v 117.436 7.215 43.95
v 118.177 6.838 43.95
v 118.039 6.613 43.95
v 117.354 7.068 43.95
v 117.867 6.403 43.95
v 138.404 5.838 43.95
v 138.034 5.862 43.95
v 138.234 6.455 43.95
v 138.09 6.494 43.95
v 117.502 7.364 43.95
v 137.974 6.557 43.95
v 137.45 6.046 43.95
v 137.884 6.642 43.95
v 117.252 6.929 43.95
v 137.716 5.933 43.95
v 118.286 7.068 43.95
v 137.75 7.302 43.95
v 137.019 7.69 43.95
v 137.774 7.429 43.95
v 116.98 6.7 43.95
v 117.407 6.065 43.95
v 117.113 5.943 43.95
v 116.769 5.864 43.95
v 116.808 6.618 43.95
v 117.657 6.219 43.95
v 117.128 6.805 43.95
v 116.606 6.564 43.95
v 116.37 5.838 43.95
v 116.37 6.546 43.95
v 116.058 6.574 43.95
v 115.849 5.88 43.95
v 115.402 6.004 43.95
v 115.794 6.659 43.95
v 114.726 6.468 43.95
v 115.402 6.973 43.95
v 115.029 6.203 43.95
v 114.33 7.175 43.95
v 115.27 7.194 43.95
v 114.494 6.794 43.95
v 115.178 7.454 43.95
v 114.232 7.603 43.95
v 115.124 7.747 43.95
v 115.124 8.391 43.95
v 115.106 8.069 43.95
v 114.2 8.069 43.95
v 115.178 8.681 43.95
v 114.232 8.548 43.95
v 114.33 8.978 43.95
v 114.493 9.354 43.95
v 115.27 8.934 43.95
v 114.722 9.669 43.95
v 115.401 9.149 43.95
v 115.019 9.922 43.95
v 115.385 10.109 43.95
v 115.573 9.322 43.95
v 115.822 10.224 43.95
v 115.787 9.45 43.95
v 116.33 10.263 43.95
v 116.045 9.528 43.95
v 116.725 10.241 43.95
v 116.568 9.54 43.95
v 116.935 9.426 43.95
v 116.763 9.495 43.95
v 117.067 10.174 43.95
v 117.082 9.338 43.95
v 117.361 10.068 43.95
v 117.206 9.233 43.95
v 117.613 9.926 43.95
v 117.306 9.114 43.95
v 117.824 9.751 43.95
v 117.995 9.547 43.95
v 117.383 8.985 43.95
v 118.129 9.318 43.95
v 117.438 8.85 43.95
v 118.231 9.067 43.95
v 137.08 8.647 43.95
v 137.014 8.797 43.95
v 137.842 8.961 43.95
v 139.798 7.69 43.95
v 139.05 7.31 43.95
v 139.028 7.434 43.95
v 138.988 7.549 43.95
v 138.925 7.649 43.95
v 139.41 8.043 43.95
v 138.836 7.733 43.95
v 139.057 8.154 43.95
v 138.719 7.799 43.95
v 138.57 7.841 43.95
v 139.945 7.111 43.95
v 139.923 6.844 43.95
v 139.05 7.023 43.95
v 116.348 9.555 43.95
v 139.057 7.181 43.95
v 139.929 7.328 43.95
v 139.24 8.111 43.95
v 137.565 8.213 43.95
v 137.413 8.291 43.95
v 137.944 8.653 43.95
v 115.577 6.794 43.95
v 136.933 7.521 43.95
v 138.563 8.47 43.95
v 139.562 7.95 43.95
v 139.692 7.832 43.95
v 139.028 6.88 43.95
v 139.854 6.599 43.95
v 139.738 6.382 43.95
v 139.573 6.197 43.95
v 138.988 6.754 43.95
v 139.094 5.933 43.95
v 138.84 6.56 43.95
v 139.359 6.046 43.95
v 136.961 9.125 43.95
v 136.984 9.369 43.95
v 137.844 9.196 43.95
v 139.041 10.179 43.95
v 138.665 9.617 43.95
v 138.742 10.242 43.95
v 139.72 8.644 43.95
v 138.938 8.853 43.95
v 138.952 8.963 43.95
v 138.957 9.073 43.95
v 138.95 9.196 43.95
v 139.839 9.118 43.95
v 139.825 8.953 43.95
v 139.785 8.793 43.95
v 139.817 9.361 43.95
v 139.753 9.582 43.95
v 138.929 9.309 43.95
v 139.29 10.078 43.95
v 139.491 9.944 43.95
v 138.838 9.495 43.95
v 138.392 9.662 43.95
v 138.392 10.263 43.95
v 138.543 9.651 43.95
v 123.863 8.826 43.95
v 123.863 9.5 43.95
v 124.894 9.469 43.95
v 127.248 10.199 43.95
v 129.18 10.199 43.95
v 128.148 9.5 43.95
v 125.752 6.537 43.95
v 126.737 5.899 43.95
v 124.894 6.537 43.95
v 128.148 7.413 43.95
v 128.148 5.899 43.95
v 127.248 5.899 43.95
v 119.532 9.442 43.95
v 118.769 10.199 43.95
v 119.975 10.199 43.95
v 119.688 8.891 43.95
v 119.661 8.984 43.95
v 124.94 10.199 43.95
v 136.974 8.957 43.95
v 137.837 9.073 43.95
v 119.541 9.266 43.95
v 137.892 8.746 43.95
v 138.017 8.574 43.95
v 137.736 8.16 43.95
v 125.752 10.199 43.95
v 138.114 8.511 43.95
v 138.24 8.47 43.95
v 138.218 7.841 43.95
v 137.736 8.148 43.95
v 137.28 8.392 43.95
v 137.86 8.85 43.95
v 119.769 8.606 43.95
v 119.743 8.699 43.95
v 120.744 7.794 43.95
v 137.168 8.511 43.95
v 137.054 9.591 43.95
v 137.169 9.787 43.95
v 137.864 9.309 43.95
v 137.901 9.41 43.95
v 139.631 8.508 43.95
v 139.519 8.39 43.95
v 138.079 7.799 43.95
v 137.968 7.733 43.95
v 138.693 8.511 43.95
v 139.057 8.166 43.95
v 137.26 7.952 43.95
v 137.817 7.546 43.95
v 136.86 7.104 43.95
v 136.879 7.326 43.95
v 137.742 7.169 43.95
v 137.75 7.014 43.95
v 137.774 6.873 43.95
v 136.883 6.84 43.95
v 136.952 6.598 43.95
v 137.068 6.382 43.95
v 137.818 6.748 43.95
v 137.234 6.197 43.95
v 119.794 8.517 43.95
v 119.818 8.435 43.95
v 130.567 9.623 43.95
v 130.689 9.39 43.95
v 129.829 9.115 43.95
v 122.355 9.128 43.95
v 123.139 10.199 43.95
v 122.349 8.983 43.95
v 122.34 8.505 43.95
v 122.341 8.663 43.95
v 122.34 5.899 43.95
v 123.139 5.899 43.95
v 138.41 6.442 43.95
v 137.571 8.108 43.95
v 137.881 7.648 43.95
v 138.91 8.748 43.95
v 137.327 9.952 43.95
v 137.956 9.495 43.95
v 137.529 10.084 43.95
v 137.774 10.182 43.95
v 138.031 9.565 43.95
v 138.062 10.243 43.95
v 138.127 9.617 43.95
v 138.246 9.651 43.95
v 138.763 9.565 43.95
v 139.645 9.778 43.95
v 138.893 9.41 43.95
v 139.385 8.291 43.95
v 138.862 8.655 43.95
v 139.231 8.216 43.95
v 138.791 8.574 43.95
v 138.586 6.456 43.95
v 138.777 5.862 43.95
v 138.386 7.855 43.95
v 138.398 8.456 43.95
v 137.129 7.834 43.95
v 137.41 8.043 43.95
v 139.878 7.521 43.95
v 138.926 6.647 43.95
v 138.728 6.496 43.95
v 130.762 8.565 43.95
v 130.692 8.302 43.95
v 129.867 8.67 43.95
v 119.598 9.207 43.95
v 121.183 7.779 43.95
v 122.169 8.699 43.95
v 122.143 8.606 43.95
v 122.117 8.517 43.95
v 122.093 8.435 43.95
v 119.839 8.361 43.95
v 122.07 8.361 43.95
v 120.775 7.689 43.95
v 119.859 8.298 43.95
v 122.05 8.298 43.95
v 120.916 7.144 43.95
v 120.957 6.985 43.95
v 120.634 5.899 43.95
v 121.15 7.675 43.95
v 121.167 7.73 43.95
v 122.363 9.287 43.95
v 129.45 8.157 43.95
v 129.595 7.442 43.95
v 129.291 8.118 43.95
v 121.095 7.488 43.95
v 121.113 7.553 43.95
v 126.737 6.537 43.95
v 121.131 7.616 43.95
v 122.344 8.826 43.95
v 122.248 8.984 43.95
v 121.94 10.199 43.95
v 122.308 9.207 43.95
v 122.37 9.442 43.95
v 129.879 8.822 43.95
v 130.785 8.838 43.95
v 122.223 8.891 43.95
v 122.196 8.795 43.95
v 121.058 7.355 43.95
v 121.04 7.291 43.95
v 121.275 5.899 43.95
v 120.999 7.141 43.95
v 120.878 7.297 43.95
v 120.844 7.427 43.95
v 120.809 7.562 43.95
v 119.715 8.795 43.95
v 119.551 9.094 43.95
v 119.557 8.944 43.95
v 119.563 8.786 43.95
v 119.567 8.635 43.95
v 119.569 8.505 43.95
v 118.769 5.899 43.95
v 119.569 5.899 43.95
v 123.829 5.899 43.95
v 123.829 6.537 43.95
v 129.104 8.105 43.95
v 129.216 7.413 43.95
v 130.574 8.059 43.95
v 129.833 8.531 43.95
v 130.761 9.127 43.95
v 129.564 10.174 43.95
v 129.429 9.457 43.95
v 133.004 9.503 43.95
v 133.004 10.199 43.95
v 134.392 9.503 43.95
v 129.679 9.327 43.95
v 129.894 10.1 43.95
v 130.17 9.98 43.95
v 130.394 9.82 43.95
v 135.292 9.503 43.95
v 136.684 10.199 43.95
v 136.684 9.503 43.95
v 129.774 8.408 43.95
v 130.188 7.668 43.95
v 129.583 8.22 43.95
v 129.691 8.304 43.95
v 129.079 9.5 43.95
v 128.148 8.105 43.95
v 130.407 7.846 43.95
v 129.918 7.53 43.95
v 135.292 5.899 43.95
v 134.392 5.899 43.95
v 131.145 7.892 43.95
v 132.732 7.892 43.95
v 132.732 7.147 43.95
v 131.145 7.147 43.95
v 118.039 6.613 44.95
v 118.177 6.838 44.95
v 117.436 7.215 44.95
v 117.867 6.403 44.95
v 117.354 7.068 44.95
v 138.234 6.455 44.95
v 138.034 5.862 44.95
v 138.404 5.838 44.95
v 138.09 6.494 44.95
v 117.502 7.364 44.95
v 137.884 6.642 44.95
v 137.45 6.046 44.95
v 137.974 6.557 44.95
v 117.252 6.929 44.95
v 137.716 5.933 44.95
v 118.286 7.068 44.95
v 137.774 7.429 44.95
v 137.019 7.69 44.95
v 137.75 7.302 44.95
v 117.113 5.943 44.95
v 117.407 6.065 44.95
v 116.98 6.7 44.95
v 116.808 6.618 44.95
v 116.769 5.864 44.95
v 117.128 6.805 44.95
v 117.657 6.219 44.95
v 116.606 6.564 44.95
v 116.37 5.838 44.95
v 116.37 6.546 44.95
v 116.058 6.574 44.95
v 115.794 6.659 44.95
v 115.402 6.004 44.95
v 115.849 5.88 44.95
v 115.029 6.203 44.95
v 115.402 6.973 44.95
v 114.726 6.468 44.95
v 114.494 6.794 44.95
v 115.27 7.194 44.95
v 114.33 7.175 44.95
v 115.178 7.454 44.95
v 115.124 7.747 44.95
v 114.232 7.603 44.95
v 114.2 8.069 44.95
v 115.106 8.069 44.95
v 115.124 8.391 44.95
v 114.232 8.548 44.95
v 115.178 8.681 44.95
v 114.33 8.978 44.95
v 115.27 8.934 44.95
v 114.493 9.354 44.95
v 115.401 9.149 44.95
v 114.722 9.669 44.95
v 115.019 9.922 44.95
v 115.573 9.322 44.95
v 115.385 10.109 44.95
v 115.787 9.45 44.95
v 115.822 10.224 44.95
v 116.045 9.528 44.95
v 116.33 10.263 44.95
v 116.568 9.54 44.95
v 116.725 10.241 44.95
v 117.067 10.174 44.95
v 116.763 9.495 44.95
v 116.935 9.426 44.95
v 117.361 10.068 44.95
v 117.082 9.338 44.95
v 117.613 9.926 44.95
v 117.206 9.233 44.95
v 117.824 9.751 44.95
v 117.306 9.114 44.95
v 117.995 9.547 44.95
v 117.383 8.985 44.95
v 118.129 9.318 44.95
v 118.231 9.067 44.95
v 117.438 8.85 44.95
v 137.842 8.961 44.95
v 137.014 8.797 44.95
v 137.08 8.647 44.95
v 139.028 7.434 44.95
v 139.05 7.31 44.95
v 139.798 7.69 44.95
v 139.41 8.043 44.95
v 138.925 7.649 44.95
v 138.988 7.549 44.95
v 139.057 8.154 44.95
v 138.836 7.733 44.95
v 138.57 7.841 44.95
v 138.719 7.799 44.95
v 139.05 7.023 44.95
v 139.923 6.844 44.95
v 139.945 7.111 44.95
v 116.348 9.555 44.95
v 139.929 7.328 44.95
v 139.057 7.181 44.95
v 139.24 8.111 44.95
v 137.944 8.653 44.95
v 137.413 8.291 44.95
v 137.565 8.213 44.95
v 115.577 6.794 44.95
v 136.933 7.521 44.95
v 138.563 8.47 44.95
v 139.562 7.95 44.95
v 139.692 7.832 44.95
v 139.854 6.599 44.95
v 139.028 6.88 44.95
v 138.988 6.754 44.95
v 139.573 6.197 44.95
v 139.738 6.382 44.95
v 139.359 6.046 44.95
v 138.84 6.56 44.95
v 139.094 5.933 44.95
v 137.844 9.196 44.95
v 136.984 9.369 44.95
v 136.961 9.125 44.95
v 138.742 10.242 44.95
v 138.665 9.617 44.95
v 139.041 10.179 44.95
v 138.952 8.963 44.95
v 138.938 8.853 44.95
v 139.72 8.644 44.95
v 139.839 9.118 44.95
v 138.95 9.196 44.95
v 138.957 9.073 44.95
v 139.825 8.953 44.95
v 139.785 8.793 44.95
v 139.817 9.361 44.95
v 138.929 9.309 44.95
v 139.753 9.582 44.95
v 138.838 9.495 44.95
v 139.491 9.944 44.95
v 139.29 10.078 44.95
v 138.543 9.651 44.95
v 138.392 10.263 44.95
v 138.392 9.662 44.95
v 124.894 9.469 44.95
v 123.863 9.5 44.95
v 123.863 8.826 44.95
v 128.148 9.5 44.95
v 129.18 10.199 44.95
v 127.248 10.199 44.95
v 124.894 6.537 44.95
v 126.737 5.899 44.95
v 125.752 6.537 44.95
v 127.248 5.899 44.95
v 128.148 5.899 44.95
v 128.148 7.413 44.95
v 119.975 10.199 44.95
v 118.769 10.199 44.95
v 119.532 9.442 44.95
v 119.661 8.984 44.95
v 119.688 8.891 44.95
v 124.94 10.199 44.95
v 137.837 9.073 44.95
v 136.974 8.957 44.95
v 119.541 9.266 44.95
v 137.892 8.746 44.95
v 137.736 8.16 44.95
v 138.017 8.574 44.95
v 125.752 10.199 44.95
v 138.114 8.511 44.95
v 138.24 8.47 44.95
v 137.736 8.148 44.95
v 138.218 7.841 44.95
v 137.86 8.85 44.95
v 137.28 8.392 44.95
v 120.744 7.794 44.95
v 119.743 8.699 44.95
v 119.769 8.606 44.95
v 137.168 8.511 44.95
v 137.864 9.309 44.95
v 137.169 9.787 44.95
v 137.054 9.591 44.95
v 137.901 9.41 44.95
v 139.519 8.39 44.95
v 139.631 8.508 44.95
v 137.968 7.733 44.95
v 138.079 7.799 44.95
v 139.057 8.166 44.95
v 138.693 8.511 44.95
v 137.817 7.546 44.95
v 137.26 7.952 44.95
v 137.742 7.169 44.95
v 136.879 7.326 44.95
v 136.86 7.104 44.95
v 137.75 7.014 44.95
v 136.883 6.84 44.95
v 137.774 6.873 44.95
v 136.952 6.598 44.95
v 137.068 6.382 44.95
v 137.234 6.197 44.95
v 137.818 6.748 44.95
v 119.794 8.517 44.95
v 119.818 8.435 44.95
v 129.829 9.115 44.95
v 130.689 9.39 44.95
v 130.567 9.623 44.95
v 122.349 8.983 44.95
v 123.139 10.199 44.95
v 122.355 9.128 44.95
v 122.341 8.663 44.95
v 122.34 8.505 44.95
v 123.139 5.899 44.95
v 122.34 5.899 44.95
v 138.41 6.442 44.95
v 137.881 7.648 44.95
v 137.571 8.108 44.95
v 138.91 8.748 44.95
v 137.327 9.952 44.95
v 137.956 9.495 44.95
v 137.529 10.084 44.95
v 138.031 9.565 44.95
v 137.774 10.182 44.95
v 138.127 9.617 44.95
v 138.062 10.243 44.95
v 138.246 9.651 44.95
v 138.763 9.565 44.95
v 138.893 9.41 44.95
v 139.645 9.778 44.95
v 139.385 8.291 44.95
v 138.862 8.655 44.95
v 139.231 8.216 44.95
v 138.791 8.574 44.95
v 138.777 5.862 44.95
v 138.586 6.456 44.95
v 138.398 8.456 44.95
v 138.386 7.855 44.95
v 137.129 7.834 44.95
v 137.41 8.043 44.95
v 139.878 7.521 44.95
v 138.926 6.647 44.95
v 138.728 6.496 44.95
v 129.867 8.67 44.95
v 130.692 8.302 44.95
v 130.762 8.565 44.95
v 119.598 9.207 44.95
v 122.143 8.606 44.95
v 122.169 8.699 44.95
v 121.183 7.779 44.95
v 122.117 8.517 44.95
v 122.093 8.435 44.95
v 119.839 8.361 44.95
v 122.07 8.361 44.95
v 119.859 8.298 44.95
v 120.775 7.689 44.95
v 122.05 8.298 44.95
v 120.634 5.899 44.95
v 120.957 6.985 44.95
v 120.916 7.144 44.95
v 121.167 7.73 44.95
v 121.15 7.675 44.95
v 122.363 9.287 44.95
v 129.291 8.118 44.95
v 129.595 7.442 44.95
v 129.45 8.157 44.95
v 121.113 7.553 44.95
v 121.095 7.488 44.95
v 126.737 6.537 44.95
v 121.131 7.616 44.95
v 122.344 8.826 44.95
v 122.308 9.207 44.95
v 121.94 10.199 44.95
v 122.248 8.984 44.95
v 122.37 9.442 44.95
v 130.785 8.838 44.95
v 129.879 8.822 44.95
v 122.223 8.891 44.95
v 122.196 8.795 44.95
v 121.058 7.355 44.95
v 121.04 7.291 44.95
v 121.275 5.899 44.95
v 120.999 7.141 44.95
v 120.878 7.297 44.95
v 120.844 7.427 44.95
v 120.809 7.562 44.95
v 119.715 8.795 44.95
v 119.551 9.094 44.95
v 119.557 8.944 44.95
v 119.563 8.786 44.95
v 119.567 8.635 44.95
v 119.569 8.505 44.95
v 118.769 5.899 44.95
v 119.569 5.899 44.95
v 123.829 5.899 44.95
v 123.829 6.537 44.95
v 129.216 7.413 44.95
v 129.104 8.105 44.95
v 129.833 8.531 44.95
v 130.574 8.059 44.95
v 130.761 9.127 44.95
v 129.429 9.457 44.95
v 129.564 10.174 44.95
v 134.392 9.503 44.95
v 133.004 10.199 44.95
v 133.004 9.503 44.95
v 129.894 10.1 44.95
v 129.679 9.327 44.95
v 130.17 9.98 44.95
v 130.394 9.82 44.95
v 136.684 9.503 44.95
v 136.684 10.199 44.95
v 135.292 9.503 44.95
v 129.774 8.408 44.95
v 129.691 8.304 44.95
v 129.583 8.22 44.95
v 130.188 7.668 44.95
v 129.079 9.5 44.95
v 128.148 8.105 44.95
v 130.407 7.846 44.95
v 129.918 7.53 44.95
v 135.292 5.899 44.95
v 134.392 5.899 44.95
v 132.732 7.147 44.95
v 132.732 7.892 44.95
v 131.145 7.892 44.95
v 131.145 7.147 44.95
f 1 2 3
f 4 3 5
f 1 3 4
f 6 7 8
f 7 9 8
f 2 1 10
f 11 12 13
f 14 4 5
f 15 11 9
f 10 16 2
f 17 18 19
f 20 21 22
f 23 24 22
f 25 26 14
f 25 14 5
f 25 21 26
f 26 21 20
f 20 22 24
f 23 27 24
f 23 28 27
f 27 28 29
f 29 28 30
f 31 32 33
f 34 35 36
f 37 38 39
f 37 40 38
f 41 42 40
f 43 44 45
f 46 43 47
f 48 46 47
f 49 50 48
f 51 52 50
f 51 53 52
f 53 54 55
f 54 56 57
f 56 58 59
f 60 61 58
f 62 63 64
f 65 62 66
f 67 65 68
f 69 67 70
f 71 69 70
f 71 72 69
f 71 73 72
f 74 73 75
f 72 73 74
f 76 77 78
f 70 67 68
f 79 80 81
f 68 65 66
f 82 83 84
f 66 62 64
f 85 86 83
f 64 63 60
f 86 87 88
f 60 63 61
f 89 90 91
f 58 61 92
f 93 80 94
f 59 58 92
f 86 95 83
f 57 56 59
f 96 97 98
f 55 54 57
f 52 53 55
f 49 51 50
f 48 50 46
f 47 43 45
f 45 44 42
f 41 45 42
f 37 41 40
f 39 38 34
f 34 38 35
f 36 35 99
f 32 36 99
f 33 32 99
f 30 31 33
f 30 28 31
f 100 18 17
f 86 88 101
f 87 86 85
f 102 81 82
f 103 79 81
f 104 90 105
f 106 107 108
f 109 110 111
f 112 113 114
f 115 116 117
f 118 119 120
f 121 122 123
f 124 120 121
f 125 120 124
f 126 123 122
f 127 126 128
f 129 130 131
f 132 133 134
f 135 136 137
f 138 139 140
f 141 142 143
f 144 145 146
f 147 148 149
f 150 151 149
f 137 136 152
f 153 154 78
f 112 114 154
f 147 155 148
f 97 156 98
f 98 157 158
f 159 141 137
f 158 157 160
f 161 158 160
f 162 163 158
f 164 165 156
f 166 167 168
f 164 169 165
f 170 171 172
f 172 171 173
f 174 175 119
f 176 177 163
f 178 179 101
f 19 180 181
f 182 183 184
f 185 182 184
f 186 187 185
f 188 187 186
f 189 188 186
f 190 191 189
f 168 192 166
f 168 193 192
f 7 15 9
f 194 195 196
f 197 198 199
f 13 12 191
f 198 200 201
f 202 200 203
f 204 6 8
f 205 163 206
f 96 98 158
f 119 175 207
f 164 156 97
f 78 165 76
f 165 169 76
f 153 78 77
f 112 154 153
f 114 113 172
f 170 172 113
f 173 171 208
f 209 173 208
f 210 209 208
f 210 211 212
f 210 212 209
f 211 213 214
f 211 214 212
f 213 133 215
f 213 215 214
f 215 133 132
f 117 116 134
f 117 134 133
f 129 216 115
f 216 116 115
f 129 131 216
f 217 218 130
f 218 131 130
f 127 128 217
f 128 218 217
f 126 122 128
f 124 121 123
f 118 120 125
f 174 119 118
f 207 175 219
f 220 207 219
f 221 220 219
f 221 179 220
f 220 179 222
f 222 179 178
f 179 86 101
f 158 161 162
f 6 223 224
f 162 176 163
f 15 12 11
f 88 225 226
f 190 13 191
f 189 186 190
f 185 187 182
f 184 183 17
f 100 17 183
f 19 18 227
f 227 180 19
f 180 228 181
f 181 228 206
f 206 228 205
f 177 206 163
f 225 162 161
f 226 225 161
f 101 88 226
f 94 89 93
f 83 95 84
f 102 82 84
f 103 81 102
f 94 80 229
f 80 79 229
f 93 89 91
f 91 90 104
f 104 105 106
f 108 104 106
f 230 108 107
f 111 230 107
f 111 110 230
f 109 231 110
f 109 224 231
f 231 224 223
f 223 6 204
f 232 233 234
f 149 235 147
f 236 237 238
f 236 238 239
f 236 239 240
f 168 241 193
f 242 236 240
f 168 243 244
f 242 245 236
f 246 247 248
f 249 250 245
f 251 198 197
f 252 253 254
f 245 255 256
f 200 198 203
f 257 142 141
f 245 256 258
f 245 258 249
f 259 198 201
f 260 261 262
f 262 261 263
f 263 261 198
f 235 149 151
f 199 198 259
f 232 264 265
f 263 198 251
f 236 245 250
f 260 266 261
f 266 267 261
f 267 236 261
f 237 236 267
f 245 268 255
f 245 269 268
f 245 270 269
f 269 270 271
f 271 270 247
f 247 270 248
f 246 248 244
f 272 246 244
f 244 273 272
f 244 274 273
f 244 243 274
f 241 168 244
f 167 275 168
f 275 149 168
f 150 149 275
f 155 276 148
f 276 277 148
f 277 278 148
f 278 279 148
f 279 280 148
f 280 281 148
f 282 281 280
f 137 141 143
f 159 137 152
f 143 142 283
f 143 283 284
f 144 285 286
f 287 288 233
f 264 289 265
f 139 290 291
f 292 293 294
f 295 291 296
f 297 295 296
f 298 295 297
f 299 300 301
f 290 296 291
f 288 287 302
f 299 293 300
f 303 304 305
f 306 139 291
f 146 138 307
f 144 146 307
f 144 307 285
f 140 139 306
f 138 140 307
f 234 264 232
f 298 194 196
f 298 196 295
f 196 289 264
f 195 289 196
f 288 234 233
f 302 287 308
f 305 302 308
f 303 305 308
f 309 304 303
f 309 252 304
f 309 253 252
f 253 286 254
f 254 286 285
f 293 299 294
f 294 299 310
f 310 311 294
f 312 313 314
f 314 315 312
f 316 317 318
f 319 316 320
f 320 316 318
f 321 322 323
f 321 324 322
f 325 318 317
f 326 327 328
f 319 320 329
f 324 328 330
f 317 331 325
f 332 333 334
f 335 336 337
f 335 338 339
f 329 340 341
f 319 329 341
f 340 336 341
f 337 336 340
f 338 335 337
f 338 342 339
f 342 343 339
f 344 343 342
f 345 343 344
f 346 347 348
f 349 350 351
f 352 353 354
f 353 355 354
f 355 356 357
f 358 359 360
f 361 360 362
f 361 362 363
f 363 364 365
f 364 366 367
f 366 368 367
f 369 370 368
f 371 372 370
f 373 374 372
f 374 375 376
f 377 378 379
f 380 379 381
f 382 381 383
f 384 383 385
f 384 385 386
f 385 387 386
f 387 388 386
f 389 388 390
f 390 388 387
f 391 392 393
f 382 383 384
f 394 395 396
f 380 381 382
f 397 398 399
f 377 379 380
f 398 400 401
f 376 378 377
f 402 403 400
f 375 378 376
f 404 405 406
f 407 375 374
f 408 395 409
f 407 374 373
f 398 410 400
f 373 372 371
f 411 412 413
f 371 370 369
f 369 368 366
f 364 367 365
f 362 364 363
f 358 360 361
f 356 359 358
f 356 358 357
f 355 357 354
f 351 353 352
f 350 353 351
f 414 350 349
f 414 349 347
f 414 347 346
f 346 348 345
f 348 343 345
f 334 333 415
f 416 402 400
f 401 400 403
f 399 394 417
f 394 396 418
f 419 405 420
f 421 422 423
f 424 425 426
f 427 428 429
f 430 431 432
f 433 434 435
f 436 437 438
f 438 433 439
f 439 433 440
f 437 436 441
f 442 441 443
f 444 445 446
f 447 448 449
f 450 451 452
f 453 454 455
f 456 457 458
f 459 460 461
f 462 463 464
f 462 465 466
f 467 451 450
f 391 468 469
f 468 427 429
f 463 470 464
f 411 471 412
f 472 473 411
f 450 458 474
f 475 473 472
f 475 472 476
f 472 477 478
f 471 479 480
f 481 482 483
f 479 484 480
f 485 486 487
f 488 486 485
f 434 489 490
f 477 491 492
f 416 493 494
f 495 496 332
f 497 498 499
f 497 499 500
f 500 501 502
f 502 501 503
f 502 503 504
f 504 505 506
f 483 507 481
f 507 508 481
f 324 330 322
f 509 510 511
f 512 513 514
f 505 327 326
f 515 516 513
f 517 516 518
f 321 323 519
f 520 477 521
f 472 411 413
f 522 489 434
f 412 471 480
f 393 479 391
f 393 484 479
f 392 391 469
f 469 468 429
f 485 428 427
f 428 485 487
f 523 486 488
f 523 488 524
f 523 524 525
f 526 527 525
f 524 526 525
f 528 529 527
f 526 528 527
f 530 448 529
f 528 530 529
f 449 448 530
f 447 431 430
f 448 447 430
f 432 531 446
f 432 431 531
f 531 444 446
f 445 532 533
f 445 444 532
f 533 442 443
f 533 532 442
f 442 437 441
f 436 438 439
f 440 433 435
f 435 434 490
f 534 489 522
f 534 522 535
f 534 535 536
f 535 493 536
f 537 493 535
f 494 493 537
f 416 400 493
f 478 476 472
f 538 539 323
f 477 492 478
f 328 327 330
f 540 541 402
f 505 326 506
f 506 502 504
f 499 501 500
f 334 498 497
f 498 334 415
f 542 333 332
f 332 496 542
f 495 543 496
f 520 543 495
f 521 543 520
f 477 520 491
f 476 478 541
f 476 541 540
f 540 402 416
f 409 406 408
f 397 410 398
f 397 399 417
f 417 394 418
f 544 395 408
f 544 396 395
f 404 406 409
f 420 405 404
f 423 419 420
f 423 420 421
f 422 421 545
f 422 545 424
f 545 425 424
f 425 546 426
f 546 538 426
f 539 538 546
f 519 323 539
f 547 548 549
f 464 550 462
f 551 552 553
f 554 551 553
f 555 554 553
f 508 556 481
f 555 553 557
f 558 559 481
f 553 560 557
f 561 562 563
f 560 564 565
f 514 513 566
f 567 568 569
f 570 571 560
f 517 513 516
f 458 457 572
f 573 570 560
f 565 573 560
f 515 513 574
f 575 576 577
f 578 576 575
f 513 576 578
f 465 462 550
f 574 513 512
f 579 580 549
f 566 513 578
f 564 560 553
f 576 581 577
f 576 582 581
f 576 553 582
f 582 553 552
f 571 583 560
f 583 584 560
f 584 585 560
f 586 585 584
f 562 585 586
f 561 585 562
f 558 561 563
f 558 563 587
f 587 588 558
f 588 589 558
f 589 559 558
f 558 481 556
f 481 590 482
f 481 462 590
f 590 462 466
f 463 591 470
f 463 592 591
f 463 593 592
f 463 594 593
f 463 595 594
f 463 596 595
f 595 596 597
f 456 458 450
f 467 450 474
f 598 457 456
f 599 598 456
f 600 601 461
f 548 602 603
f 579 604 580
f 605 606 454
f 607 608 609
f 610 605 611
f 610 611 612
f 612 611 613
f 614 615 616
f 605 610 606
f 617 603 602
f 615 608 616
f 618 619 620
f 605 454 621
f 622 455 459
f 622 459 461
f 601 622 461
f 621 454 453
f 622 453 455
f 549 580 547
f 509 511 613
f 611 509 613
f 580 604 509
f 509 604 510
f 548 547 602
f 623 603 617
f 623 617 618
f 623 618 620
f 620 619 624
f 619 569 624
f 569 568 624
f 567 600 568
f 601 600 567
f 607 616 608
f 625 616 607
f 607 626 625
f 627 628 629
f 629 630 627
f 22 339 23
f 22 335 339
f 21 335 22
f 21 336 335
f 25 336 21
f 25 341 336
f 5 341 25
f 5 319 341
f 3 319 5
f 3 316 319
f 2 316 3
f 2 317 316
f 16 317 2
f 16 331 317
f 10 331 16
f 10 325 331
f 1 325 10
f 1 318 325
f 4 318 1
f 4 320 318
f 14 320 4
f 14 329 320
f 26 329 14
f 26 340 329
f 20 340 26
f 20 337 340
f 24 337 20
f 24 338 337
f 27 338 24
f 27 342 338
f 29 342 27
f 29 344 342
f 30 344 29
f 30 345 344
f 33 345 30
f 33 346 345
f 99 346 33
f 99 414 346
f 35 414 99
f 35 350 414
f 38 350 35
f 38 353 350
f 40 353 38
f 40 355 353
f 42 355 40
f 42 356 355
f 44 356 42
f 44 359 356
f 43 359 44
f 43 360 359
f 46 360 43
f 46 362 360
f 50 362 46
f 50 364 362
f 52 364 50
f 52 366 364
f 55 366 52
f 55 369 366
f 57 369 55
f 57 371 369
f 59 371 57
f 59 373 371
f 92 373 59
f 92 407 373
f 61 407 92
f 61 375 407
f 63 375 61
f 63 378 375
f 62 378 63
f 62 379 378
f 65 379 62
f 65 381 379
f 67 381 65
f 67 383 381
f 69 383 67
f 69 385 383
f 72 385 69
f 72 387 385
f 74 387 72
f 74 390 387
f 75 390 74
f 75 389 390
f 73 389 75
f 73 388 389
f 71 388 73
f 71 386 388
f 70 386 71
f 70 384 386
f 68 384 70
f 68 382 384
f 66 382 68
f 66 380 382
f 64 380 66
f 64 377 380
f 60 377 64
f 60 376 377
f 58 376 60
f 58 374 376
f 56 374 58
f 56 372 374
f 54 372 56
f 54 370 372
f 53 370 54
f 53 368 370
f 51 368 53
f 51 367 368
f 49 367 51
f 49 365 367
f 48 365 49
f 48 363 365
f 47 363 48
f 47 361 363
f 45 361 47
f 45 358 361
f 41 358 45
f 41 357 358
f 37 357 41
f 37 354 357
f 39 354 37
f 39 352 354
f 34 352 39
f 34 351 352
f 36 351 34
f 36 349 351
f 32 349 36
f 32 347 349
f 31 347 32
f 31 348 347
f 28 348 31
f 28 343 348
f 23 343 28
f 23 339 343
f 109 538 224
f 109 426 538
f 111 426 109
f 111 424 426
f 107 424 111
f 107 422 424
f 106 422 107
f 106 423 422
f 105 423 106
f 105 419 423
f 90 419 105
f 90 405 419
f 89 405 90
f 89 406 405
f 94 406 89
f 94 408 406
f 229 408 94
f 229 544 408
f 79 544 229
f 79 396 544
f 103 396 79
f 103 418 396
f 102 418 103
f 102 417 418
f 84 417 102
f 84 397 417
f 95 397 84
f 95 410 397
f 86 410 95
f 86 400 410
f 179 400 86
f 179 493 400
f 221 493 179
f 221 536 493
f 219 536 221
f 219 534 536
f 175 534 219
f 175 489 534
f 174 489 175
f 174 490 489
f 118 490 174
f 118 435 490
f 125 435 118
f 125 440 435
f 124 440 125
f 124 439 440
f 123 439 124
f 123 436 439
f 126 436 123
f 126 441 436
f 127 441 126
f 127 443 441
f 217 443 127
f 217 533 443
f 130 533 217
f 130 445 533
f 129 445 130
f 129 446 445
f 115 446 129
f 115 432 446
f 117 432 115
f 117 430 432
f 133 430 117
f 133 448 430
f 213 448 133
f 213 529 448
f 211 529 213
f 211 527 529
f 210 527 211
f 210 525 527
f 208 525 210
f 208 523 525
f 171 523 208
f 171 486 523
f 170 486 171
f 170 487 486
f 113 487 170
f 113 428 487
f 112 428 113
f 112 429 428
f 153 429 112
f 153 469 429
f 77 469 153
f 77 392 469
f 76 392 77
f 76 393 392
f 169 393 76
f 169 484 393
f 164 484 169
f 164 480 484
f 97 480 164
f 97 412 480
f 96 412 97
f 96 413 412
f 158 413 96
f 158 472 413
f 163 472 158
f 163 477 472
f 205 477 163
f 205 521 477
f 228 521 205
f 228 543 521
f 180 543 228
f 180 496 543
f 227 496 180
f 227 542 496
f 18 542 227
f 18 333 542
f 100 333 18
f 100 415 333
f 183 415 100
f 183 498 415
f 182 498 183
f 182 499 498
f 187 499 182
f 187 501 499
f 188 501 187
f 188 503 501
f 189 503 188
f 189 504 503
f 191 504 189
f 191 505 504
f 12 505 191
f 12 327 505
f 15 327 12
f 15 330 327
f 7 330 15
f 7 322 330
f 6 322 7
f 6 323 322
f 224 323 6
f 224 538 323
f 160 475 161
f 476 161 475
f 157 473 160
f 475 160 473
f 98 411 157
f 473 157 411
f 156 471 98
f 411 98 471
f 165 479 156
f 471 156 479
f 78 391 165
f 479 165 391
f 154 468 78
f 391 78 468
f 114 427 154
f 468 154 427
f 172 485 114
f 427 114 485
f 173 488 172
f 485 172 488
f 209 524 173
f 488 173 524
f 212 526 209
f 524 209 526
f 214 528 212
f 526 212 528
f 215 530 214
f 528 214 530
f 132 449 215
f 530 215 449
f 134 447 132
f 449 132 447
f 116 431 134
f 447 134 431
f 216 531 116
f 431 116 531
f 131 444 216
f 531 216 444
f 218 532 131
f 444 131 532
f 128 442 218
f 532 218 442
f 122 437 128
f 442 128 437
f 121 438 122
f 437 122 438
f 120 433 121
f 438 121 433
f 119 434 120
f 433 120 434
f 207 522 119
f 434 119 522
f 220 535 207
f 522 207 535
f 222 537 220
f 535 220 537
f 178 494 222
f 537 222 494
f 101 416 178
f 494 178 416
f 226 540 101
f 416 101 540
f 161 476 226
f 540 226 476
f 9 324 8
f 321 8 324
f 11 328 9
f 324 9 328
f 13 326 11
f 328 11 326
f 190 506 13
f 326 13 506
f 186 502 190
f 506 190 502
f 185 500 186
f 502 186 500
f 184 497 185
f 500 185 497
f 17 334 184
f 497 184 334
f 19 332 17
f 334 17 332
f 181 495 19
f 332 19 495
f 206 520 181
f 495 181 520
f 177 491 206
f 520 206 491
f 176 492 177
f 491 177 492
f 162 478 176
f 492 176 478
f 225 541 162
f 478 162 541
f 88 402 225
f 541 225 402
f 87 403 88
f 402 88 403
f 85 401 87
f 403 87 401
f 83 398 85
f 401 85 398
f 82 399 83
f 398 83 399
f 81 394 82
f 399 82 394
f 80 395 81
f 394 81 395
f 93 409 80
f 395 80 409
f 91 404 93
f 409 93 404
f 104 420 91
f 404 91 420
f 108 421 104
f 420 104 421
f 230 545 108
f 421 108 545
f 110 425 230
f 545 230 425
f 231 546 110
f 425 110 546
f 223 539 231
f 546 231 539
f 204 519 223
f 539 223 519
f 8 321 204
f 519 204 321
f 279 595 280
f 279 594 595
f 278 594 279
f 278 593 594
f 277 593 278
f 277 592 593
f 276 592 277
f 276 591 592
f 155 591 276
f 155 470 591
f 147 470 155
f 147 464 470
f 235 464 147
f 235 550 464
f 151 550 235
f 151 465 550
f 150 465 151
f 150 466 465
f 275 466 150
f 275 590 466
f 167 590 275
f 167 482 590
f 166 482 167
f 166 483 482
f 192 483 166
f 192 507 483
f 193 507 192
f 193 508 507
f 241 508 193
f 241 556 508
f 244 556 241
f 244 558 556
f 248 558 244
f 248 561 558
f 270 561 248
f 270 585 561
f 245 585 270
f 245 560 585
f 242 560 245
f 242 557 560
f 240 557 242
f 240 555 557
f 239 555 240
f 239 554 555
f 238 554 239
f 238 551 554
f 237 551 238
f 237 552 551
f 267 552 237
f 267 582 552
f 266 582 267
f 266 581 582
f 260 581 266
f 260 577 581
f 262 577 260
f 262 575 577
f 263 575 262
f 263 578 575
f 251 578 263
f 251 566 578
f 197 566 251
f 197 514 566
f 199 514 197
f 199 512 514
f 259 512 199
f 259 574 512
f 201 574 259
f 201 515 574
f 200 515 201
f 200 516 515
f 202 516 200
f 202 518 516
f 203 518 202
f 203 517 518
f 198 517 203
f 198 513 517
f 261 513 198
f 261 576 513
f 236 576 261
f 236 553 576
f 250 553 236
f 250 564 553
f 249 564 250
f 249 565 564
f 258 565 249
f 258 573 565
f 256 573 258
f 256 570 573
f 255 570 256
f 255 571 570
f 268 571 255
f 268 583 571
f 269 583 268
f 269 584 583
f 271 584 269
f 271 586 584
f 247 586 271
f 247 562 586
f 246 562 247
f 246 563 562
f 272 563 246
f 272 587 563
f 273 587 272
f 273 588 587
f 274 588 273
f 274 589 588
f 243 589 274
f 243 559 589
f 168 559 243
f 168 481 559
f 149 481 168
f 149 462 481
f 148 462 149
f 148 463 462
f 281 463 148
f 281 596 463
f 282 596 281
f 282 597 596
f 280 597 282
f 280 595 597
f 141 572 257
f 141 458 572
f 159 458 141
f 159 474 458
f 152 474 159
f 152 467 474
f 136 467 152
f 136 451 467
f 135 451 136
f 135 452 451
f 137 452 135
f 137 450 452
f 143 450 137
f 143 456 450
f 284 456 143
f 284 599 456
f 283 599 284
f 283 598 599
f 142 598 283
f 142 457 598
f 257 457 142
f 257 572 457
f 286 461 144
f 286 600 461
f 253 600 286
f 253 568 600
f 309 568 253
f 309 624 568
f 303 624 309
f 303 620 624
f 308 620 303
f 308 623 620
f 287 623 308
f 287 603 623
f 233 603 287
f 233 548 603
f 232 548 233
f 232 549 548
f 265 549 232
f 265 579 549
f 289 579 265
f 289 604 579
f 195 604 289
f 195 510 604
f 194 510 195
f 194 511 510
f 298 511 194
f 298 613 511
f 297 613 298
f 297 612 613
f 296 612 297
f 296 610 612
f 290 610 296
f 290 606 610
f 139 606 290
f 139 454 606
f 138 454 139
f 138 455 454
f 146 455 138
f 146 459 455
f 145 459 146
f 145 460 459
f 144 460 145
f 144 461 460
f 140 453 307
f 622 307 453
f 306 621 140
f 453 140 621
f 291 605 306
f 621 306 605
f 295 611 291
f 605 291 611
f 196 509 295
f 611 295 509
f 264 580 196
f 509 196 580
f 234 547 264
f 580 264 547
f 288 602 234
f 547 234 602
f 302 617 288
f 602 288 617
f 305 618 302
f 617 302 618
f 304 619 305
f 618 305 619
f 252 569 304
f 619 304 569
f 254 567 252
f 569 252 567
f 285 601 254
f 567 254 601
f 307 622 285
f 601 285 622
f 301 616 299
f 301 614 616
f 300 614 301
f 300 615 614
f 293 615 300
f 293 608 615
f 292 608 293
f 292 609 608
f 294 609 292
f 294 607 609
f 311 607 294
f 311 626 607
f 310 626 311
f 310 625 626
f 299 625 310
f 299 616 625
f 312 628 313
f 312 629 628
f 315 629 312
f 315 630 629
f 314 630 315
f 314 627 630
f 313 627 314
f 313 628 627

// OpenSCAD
// CM1P-T8 ID text, engraved 0.5 into the plate's top face (frame as cm1p_t8_freecad.py).
translate([127, 8, 43.95]) linear_extrude(1) text("CM1P-T8", size = 4.5, font = "Liberation Sans:style=Bold", halign = "center", valign = "center");
